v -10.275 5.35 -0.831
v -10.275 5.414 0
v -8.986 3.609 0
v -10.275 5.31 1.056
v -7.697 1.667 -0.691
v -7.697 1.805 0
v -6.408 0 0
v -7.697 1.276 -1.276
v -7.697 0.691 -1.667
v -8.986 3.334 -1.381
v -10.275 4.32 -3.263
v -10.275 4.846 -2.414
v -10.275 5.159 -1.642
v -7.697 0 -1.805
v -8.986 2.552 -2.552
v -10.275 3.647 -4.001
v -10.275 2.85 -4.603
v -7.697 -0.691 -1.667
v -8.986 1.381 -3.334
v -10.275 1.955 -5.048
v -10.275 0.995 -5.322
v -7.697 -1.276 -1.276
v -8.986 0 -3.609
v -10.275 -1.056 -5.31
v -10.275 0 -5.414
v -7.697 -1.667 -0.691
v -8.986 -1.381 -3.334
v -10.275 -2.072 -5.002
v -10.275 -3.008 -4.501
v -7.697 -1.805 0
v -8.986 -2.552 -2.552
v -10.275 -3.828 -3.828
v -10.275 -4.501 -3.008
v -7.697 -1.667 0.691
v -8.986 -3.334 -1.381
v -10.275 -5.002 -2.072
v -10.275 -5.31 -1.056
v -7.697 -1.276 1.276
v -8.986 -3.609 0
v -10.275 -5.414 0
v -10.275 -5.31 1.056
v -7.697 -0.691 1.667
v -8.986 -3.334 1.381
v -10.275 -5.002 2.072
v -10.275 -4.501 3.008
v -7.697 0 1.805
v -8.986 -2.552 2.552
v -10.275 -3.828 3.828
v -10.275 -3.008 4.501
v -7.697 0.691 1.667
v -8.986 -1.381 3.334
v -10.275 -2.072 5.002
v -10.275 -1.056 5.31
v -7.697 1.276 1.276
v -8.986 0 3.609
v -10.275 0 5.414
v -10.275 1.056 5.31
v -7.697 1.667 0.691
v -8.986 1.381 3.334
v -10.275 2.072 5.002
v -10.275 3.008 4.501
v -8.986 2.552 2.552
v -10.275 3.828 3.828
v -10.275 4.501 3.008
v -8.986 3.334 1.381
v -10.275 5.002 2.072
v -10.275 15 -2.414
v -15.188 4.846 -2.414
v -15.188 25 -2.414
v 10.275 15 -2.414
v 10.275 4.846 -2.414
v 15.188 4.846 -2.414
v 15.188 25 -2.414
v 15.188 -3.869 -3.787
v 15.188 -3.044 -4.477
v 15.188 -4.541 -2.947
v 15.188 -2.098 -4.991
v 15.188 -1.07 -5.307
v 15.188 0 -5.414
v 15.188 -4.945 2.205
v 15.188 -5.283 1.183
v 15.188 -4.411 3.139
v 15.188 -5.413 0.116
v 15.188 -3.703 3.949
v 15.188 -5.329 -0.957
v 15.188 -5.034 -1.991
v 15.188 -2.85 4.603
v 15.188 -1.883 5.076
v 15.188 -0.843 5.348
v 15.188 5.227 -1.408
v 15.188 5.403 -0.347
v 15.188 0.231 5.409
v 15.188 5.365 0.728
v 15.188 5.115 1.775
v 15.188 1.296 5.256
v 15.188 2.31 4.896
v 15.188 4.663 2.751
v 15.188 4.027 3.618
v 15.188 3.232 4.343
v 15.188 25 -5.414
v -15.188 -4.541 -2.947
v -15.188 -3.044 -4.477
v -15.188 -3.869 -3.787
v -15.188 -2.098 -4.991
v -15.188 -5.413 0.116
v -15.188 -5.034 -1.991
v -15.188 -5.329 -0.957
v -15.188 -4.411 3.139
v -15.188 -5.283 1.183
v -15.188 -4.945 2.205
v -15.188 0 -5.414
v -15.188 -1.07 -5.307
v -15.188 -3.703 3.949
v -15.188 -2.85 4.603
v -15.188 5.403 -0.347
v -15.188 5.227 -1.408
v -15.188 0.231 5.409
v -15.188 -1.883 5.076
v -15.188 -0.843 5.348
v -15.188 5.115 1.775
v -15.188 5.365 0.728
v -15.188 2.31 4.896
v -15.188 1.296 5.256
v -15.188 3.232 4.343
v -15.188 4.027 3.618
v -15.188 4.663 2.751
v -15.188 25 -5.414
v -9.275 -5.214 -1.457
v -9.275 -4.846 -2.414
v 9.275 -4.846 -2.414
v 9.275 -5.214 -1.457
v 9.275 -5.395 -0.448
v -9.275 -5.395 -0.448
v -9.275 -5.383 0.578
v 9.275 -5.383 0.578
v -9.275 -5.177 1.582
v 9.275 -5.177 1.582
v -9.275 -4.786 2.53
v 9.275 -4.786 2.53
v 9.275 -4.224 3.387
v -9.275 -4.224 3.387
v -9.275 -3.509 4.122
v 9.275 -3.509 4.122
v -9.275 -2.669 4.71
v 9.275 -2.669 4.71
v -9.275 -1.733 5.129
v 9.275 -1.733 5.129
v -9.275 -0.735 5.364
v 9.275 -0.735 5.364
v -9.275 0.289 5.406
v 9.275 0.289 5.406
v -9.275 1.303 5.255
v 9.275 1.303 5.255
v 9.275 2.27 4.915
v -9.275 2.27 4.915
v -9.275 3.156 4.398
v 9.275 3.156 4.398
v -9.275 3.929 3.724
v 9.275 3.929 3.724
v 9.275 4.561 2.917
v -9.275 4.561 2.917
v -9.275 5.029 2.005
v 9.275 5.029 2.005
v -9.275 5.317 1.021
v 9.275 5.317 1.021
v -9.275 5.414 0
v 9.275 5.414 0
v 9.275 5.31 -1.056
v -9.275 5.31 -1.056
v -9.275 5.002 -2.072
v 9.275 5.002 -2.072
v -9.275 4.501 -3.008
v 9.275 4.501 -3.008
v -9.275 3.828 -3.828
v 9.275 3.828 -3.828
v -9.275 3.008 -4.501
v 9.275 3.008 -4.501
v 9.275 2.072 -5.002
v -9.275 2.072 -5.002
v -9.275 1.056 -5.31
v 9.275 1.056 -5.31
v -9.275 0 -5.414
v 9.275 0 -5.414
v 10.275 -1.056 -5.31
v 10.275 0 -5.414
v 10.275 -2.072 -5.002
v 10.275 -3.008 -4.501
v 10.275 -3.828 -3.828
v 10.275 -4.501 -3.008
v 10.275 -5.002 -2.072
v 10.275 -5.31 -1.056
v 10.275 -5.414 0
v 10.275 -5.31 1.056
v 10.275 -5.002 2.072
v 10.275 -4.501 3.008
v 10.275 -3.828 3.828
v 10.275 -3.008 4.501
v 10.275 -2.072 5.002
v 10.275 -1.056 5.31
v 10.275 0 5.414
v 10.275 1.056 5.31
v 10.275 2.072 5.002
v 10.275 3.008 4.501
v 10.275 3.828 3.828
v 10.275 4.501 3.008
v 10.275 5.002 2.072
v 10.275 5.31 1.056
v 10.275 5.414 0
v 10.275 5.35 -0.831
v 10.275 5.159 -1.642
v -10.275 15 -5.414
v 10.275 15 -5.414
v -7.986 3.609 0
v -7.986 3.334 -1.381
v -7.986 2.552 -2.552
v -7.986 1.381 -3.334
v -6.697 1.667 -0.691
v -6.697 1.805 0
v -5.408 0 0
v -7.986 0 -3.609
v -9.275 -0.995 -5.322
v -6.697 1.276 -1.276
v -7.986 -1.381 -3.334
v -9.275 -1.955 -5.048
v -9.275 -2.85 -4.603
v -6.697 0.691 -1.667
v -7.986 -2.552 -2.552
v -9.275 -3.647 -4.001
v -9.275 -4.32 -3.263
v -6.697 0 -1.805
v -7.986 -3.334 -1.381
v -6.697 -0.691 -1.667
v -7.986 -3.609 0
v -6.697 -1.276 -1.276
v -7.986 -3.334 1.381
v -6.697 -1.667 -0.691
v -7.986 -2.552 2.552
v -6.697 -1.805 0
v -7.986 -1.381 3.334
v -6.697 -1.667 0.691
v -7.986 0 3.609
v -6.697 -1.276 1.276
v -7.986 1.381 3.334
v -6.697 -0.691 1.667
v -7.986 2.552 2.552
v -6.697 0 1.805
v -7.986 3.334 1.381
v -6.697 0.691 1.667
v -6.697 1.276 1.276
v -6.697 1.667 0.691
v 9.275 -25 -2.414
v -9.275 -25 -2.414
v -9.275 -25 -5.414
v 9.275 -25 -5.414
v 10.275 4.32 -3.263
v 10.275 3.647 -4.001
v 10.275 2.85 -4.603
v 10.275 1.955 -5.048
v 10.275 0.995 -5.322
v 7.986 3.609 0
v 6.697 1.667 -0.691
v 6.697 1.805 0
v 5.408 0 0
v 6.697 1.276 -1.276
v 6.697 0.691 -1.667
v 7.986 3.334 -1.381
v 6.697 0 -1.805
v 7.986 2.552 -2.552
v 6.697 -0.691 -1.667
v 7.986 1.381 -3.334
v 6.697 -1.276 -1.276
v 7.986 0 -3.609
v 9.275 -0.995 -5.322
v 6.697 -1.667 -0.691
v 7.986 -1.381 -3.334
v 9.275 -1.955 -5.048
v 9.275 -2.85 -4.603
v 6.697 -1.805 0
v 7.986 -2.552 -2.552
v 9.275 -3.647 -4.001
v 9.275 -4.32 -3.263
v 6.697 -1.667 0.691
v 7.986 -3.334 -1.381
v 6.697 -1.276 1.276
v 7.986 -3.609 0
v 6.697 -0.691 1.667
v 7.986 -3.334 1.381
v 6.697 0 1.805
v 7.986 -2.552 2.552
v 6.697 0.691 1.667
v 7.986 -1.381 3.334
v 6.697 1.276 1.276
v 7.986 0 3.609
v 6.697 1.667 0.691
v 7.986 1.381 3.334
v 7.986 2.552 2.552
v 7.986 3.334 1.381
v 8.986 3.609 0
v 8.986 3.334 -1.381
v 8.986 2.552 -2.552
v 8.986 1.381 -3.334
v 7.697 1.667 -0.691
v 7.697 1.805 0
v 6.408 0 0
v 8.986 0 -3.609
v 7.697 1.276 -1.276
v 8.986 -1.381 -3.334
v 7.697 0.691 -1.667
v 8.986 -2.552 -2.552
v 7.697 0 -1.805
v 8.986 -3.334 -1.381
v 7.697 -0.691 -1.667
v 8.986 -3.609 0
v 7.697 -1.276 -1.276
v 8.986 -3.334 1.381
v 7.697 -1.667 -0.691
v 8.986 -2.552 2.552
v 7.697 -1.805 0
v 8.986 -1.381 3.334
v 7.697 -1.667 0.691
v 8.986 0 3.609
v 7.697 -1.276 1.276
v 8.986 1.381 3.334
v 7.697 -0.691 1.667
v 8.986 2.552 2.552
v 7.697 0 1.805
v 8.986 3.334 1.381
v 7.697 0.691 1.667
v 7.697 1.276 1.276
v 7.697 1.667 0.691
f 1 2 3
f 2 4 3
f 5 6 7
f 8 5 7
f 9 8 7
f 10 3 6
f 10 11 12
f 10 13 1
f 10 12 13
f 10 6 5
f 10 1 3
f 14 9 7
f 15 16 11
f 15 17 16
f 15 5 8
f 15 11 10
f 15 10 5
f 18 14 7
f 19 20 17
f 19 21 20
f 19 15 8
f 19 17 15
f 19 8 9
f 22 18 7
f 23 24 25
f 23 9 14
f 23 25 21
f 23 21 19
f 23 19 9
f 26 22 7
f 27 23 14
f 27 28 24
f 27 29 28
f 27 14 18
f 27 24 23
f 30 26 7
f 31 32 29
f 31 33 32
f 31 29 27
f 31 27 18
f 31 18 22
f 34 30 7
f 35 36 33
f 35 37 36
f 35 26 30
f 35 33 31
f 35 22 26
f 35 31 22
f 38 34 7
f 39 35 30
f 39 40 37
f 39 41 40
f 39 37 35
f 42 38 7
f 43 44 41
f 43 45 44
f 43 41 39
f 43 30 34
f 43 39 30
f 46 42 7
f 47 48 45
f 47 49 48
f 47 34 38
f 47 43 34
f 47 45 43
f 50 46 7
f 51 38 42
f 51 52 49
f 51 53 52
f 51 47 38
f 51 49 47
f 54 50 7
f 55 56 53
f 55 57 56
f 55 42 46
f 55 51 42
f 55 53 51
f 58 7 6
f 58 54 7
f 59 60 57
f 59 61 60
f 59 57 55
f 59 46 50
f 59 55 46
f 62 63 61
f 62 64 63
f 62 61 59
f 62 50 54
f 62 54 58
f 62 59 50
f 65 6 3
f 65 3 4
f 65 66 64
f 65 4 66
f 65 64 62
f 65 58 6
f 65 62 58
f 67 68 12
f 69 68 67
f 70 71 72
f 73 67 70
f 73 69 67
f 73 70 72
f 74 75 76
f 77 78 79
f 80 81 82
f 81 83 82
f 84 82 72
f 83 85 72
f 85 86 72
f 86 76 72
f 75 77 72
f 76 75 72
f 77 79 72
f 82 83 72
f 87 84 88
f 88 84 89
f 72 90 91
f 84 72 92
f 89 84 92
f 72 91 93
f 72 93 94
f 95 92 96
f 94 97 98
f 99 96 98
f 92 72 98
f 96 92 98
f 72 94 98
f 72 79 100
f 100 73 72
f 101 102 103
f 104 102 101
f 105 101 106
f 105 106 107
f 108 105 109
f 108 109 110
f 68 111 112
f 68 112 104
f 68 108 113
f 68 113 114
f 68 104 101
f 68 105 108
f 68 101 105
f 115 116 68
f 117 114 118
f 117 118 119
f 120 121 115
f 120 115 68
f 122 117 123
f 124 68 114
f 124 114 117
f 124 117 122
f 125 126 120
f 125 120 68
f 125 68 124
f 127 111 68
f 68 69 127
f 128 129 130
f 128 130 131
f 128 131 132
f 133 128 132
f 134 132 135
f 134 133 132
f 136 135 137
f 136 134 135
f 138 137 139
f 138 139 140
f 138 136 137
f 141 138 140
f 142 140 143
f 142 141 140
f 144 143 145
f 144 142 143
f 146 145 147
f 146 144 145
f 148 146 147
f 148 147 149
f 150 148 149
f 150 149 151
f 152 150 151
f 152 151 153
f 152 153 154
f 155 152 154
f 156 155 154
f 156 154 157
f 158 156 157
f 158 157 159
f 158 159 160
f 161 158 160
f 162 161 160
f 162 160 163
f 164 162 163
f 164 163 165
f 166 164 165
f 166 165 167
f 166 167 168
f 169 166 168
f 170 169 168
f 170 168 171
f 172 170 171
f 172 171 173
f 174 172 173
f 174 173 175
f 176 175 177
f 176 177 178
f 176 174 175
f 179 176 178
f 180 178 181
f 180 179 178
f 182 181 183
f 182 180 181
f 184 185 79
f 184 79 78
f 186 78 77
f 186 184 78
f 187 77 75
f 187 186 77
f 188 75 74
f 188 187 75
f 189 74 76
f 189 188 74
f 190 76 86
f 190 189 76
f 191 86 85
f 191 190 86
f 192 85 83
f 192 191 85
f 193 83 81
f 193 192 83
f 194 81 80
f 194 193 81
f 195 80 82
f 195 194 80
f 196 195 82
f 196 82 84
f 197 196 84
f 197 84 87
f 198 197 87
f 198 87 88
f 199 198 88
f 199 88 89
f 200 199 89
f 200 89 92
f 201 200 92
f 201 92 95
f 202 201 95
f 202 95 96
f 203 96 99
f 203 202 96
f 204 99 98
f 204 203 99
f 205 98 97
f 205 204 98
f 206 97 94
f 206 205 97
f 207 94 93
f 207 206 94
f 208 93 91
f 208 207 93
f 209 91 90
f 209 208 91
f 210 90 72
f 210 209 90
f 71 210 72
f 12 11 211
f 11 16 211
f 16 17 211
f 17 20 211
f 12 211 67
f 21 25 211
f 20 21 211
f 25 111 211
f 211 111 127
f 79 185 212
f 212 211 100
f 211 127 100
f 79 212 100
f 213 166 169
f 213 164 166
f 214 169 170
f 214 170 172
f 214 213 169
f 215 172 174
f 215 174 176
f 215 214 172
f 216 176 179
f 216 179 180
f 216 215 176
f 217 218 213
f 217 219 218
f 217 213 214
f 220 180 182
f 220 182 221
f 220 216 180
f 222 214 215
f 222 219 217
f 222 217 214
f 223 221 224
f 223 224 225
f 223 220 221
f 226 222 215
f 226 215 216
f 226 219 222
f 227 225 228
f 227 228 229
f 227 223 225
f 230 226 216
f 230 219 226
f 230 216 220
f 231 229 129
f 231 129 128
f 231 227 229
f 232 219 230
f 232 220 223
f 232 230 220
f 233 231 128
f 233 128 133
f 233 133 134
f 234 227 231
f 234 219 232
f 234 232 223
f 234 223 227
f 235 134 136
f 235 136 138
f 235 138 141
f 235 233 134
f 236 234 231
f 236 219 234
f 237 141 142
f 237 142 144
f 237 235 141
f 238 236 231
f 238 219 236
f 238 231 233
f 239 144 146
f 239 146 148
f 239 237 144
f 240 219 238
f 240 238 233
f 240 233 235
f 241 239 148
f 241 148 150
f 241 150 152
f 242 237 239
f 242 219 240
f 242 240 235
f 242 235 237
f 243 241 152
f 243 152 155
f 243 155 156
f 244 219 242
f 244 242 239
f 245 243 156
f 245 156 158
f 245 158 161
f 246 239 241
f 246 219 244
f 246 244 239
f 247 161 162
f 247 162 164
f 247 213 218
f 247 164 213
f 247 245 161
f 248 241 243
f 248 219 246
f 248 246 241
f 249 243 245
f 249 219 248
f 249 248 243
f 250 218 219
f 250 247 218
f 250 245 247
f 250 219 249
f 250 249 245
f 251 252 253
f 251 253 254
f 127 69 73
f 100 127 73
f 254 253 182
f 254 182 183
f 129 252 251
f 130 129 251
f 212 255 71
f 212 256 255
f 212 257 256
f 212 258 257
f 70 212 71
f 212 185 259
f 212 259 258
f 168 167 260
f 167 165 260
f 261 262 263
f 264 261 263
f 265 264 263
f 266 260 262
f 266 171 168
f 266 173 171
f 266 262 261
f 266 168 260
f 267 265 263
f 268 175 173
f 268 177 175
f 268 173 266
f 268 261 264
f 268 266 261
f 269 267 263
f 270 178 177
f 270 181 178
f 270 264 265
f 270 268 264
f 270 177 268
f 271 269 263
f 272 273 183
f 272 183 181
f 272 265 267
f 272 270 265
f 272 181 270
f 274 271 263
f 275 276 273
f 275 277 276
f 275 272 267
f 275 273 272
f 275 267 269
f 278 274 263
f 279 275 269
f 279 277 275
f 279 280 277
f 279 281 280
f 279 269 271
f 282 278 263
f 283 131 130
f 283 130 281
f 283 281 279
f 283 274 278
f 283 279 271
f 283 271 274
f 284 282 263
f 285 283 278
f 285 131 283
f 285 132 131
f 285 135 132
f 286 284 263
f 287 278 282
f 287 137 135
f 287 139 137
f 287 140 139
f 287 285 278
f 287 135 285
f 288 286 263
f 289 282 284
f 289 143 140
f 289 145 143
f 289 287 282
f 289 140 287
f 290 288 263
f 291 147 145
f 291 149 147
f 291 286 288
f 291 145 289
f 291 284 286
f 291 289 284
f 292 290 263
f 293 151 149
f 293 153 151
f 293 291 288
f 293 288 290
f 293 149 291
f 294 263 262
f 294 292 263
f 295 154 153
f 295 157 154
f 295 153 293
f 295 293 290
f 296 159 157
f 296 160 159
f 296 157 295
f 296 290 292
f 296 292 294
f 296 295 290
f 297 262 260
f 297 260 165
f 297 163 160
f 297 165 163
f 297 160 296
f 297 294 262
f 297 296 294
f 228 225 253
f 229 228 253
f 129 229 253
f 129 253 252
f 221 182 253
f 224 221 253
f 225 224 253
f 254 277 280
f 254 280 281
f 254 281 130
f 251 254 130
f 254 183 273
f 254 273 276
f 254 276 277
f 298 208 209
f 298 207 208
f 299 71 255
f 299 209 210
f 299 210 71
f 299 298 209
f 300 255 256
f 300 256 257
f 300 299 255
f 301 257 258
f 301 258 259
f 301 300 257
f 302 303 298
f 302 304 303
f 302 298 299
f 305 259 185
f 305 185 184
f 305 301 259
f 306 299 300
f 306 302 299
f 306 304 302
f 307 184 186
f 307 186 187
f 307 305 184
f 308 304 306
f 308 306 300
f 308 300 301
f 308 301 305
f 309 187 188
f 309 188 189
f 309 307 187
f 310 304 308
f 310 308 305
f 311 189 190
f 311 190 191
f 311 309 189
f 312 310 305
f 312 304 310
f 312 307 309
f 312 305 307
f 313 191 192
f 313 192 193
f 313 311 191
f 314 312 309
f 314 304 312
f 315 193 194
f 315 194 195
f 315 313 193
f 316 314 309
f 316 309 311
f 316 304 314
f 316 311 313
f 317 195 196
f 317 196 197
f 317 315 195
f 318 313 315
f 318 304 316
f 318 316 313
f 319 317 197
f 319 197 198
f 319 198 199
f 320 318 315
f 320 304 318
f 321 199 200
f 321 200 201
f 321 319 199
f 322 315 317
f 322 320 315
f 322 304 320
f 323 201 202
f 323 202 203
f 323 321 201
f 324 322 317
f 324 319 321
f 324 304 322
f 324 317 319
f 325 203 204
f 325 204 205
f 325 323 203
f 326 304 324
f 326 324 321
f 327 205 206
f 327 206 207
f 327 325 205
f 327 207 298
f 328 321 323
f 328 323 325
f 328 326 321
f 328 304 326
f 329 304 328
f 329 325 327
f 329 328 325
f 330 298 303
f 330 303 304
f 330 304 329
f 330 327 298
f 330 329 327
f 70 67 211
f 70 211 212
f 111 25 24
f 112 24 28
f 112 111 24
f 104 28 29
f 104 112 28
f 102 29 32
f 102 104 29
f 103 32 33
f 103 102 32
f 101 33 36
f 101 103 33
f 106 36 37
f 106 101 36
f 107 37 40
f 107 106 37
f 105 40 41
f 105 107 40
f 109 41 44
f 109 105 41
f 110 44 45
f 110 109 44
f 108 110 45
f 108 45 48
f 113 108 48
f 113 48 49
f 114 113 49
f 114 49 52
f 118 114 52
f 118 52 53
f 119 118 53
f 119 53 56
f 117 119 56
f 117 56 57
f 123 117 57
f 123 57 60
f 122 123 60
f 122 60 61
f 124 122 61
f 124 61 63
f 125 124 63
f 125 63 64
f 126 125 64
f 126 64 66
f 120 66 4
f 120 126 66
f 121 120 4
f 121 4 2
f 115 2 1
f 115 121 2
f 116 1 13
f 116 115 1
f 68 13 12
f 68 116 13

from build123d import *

# Parameters (mm, degrees)
F4_W     = 18.5505142563
F4_H     = 3
F6_W     = 4.9131528187
F6_H     = 3
F7_DEPTH = 25.0000000466
F9_DEPTH = 3


with BuildPart() as f1:
    # F0 (on Top) → F1 (revolve)
    with BuildSketch(Plane.XY):
        Polygon((-15.1884099469, 0), (-6.408184309, 0), (-10.2752571281, 5.4137380794), (-15.1884099469, 5.4137380794), align=None)
    revolve(axis=Axis((-2.7040921545, 0, 0), (-1, 0, 0)))

    # F6 (on offset) → F7, piece 2 (join, through all)
    with BuildSketch(Plane.XZ.offset(-25)):
        with Locations((-12.7318335375, -3.9137380794)):
            Rectangle(F6_W, F6_H)
    extrude(amount=F7_DEPTH)



with BuildPart() as f1b:
    # F0 (on Top) → F1, piece 2 (revolve)
    with BuildSketch(Plane.XY):
        Polygon((-5.408184309, 0), (0, 0), (0, 5.4137380794), (-9.2752571281, 5.4137380794), align=None)
        Polygon((0, 5.4137380794), (0, 0), (5.408184309, 0), (9.2752571281, 5.4137380794), align=None)
    revolve(axis=Axis((-2.7040921545, 0, 0), (-1, 0, 0)))

    # F4 (on offset) → F5 (join, up to the next surface of F1b)
    with BuildSketch(Plane.XZ.offset(25)):
        with Locations((0, -3.9137380794)):
            Rectangle(F4_W, F4_H)
    extrude(until=Until.NEXT, dir=(0, 1, 0))


with BuildPart() as f1c:
    # F0 (on Top) → F1, piece 3 (revolve)
    with BuildSketch(Plane.XY):
        Polygon((15.1884099469, 5.4137380794), (10.2752571281, 5.4137380794), (6.408184309, 0), (15.1884099469, 0), align=None)
    revolve(axis=Axis((-2.7040921545, 0, 0), (-1, 0, 0)))

    # F6 (on offset) → F7 (join, through all)
    with BuildSketch(Plane.XZ.offset(-25)):
        with Locations((12.7318335375, -3.9137380794)):
            Rectangle(F6_W, F6_H)
    extrude(amount=F7_DEPTH)


with BuildPart() as f1_1:
    add(f1.part)

    add(f1c.part)  # F9 merges F1c
    # F8 (on face) → F9 (join, through all)
    with BuildSketch(Plane.XY.offset(-2.4137380794)):
        Polygon((-15.1884099469, 25), (-15.1884099469, 15), (15.1884099469, 15), (15.1884099469, 25), (10.2752571281, 25), (-10.2752571281, 25), align=None)
    extrude(amount=-F9_DEPTH)


solid = Compound([f1b.part, f1_1.part])
